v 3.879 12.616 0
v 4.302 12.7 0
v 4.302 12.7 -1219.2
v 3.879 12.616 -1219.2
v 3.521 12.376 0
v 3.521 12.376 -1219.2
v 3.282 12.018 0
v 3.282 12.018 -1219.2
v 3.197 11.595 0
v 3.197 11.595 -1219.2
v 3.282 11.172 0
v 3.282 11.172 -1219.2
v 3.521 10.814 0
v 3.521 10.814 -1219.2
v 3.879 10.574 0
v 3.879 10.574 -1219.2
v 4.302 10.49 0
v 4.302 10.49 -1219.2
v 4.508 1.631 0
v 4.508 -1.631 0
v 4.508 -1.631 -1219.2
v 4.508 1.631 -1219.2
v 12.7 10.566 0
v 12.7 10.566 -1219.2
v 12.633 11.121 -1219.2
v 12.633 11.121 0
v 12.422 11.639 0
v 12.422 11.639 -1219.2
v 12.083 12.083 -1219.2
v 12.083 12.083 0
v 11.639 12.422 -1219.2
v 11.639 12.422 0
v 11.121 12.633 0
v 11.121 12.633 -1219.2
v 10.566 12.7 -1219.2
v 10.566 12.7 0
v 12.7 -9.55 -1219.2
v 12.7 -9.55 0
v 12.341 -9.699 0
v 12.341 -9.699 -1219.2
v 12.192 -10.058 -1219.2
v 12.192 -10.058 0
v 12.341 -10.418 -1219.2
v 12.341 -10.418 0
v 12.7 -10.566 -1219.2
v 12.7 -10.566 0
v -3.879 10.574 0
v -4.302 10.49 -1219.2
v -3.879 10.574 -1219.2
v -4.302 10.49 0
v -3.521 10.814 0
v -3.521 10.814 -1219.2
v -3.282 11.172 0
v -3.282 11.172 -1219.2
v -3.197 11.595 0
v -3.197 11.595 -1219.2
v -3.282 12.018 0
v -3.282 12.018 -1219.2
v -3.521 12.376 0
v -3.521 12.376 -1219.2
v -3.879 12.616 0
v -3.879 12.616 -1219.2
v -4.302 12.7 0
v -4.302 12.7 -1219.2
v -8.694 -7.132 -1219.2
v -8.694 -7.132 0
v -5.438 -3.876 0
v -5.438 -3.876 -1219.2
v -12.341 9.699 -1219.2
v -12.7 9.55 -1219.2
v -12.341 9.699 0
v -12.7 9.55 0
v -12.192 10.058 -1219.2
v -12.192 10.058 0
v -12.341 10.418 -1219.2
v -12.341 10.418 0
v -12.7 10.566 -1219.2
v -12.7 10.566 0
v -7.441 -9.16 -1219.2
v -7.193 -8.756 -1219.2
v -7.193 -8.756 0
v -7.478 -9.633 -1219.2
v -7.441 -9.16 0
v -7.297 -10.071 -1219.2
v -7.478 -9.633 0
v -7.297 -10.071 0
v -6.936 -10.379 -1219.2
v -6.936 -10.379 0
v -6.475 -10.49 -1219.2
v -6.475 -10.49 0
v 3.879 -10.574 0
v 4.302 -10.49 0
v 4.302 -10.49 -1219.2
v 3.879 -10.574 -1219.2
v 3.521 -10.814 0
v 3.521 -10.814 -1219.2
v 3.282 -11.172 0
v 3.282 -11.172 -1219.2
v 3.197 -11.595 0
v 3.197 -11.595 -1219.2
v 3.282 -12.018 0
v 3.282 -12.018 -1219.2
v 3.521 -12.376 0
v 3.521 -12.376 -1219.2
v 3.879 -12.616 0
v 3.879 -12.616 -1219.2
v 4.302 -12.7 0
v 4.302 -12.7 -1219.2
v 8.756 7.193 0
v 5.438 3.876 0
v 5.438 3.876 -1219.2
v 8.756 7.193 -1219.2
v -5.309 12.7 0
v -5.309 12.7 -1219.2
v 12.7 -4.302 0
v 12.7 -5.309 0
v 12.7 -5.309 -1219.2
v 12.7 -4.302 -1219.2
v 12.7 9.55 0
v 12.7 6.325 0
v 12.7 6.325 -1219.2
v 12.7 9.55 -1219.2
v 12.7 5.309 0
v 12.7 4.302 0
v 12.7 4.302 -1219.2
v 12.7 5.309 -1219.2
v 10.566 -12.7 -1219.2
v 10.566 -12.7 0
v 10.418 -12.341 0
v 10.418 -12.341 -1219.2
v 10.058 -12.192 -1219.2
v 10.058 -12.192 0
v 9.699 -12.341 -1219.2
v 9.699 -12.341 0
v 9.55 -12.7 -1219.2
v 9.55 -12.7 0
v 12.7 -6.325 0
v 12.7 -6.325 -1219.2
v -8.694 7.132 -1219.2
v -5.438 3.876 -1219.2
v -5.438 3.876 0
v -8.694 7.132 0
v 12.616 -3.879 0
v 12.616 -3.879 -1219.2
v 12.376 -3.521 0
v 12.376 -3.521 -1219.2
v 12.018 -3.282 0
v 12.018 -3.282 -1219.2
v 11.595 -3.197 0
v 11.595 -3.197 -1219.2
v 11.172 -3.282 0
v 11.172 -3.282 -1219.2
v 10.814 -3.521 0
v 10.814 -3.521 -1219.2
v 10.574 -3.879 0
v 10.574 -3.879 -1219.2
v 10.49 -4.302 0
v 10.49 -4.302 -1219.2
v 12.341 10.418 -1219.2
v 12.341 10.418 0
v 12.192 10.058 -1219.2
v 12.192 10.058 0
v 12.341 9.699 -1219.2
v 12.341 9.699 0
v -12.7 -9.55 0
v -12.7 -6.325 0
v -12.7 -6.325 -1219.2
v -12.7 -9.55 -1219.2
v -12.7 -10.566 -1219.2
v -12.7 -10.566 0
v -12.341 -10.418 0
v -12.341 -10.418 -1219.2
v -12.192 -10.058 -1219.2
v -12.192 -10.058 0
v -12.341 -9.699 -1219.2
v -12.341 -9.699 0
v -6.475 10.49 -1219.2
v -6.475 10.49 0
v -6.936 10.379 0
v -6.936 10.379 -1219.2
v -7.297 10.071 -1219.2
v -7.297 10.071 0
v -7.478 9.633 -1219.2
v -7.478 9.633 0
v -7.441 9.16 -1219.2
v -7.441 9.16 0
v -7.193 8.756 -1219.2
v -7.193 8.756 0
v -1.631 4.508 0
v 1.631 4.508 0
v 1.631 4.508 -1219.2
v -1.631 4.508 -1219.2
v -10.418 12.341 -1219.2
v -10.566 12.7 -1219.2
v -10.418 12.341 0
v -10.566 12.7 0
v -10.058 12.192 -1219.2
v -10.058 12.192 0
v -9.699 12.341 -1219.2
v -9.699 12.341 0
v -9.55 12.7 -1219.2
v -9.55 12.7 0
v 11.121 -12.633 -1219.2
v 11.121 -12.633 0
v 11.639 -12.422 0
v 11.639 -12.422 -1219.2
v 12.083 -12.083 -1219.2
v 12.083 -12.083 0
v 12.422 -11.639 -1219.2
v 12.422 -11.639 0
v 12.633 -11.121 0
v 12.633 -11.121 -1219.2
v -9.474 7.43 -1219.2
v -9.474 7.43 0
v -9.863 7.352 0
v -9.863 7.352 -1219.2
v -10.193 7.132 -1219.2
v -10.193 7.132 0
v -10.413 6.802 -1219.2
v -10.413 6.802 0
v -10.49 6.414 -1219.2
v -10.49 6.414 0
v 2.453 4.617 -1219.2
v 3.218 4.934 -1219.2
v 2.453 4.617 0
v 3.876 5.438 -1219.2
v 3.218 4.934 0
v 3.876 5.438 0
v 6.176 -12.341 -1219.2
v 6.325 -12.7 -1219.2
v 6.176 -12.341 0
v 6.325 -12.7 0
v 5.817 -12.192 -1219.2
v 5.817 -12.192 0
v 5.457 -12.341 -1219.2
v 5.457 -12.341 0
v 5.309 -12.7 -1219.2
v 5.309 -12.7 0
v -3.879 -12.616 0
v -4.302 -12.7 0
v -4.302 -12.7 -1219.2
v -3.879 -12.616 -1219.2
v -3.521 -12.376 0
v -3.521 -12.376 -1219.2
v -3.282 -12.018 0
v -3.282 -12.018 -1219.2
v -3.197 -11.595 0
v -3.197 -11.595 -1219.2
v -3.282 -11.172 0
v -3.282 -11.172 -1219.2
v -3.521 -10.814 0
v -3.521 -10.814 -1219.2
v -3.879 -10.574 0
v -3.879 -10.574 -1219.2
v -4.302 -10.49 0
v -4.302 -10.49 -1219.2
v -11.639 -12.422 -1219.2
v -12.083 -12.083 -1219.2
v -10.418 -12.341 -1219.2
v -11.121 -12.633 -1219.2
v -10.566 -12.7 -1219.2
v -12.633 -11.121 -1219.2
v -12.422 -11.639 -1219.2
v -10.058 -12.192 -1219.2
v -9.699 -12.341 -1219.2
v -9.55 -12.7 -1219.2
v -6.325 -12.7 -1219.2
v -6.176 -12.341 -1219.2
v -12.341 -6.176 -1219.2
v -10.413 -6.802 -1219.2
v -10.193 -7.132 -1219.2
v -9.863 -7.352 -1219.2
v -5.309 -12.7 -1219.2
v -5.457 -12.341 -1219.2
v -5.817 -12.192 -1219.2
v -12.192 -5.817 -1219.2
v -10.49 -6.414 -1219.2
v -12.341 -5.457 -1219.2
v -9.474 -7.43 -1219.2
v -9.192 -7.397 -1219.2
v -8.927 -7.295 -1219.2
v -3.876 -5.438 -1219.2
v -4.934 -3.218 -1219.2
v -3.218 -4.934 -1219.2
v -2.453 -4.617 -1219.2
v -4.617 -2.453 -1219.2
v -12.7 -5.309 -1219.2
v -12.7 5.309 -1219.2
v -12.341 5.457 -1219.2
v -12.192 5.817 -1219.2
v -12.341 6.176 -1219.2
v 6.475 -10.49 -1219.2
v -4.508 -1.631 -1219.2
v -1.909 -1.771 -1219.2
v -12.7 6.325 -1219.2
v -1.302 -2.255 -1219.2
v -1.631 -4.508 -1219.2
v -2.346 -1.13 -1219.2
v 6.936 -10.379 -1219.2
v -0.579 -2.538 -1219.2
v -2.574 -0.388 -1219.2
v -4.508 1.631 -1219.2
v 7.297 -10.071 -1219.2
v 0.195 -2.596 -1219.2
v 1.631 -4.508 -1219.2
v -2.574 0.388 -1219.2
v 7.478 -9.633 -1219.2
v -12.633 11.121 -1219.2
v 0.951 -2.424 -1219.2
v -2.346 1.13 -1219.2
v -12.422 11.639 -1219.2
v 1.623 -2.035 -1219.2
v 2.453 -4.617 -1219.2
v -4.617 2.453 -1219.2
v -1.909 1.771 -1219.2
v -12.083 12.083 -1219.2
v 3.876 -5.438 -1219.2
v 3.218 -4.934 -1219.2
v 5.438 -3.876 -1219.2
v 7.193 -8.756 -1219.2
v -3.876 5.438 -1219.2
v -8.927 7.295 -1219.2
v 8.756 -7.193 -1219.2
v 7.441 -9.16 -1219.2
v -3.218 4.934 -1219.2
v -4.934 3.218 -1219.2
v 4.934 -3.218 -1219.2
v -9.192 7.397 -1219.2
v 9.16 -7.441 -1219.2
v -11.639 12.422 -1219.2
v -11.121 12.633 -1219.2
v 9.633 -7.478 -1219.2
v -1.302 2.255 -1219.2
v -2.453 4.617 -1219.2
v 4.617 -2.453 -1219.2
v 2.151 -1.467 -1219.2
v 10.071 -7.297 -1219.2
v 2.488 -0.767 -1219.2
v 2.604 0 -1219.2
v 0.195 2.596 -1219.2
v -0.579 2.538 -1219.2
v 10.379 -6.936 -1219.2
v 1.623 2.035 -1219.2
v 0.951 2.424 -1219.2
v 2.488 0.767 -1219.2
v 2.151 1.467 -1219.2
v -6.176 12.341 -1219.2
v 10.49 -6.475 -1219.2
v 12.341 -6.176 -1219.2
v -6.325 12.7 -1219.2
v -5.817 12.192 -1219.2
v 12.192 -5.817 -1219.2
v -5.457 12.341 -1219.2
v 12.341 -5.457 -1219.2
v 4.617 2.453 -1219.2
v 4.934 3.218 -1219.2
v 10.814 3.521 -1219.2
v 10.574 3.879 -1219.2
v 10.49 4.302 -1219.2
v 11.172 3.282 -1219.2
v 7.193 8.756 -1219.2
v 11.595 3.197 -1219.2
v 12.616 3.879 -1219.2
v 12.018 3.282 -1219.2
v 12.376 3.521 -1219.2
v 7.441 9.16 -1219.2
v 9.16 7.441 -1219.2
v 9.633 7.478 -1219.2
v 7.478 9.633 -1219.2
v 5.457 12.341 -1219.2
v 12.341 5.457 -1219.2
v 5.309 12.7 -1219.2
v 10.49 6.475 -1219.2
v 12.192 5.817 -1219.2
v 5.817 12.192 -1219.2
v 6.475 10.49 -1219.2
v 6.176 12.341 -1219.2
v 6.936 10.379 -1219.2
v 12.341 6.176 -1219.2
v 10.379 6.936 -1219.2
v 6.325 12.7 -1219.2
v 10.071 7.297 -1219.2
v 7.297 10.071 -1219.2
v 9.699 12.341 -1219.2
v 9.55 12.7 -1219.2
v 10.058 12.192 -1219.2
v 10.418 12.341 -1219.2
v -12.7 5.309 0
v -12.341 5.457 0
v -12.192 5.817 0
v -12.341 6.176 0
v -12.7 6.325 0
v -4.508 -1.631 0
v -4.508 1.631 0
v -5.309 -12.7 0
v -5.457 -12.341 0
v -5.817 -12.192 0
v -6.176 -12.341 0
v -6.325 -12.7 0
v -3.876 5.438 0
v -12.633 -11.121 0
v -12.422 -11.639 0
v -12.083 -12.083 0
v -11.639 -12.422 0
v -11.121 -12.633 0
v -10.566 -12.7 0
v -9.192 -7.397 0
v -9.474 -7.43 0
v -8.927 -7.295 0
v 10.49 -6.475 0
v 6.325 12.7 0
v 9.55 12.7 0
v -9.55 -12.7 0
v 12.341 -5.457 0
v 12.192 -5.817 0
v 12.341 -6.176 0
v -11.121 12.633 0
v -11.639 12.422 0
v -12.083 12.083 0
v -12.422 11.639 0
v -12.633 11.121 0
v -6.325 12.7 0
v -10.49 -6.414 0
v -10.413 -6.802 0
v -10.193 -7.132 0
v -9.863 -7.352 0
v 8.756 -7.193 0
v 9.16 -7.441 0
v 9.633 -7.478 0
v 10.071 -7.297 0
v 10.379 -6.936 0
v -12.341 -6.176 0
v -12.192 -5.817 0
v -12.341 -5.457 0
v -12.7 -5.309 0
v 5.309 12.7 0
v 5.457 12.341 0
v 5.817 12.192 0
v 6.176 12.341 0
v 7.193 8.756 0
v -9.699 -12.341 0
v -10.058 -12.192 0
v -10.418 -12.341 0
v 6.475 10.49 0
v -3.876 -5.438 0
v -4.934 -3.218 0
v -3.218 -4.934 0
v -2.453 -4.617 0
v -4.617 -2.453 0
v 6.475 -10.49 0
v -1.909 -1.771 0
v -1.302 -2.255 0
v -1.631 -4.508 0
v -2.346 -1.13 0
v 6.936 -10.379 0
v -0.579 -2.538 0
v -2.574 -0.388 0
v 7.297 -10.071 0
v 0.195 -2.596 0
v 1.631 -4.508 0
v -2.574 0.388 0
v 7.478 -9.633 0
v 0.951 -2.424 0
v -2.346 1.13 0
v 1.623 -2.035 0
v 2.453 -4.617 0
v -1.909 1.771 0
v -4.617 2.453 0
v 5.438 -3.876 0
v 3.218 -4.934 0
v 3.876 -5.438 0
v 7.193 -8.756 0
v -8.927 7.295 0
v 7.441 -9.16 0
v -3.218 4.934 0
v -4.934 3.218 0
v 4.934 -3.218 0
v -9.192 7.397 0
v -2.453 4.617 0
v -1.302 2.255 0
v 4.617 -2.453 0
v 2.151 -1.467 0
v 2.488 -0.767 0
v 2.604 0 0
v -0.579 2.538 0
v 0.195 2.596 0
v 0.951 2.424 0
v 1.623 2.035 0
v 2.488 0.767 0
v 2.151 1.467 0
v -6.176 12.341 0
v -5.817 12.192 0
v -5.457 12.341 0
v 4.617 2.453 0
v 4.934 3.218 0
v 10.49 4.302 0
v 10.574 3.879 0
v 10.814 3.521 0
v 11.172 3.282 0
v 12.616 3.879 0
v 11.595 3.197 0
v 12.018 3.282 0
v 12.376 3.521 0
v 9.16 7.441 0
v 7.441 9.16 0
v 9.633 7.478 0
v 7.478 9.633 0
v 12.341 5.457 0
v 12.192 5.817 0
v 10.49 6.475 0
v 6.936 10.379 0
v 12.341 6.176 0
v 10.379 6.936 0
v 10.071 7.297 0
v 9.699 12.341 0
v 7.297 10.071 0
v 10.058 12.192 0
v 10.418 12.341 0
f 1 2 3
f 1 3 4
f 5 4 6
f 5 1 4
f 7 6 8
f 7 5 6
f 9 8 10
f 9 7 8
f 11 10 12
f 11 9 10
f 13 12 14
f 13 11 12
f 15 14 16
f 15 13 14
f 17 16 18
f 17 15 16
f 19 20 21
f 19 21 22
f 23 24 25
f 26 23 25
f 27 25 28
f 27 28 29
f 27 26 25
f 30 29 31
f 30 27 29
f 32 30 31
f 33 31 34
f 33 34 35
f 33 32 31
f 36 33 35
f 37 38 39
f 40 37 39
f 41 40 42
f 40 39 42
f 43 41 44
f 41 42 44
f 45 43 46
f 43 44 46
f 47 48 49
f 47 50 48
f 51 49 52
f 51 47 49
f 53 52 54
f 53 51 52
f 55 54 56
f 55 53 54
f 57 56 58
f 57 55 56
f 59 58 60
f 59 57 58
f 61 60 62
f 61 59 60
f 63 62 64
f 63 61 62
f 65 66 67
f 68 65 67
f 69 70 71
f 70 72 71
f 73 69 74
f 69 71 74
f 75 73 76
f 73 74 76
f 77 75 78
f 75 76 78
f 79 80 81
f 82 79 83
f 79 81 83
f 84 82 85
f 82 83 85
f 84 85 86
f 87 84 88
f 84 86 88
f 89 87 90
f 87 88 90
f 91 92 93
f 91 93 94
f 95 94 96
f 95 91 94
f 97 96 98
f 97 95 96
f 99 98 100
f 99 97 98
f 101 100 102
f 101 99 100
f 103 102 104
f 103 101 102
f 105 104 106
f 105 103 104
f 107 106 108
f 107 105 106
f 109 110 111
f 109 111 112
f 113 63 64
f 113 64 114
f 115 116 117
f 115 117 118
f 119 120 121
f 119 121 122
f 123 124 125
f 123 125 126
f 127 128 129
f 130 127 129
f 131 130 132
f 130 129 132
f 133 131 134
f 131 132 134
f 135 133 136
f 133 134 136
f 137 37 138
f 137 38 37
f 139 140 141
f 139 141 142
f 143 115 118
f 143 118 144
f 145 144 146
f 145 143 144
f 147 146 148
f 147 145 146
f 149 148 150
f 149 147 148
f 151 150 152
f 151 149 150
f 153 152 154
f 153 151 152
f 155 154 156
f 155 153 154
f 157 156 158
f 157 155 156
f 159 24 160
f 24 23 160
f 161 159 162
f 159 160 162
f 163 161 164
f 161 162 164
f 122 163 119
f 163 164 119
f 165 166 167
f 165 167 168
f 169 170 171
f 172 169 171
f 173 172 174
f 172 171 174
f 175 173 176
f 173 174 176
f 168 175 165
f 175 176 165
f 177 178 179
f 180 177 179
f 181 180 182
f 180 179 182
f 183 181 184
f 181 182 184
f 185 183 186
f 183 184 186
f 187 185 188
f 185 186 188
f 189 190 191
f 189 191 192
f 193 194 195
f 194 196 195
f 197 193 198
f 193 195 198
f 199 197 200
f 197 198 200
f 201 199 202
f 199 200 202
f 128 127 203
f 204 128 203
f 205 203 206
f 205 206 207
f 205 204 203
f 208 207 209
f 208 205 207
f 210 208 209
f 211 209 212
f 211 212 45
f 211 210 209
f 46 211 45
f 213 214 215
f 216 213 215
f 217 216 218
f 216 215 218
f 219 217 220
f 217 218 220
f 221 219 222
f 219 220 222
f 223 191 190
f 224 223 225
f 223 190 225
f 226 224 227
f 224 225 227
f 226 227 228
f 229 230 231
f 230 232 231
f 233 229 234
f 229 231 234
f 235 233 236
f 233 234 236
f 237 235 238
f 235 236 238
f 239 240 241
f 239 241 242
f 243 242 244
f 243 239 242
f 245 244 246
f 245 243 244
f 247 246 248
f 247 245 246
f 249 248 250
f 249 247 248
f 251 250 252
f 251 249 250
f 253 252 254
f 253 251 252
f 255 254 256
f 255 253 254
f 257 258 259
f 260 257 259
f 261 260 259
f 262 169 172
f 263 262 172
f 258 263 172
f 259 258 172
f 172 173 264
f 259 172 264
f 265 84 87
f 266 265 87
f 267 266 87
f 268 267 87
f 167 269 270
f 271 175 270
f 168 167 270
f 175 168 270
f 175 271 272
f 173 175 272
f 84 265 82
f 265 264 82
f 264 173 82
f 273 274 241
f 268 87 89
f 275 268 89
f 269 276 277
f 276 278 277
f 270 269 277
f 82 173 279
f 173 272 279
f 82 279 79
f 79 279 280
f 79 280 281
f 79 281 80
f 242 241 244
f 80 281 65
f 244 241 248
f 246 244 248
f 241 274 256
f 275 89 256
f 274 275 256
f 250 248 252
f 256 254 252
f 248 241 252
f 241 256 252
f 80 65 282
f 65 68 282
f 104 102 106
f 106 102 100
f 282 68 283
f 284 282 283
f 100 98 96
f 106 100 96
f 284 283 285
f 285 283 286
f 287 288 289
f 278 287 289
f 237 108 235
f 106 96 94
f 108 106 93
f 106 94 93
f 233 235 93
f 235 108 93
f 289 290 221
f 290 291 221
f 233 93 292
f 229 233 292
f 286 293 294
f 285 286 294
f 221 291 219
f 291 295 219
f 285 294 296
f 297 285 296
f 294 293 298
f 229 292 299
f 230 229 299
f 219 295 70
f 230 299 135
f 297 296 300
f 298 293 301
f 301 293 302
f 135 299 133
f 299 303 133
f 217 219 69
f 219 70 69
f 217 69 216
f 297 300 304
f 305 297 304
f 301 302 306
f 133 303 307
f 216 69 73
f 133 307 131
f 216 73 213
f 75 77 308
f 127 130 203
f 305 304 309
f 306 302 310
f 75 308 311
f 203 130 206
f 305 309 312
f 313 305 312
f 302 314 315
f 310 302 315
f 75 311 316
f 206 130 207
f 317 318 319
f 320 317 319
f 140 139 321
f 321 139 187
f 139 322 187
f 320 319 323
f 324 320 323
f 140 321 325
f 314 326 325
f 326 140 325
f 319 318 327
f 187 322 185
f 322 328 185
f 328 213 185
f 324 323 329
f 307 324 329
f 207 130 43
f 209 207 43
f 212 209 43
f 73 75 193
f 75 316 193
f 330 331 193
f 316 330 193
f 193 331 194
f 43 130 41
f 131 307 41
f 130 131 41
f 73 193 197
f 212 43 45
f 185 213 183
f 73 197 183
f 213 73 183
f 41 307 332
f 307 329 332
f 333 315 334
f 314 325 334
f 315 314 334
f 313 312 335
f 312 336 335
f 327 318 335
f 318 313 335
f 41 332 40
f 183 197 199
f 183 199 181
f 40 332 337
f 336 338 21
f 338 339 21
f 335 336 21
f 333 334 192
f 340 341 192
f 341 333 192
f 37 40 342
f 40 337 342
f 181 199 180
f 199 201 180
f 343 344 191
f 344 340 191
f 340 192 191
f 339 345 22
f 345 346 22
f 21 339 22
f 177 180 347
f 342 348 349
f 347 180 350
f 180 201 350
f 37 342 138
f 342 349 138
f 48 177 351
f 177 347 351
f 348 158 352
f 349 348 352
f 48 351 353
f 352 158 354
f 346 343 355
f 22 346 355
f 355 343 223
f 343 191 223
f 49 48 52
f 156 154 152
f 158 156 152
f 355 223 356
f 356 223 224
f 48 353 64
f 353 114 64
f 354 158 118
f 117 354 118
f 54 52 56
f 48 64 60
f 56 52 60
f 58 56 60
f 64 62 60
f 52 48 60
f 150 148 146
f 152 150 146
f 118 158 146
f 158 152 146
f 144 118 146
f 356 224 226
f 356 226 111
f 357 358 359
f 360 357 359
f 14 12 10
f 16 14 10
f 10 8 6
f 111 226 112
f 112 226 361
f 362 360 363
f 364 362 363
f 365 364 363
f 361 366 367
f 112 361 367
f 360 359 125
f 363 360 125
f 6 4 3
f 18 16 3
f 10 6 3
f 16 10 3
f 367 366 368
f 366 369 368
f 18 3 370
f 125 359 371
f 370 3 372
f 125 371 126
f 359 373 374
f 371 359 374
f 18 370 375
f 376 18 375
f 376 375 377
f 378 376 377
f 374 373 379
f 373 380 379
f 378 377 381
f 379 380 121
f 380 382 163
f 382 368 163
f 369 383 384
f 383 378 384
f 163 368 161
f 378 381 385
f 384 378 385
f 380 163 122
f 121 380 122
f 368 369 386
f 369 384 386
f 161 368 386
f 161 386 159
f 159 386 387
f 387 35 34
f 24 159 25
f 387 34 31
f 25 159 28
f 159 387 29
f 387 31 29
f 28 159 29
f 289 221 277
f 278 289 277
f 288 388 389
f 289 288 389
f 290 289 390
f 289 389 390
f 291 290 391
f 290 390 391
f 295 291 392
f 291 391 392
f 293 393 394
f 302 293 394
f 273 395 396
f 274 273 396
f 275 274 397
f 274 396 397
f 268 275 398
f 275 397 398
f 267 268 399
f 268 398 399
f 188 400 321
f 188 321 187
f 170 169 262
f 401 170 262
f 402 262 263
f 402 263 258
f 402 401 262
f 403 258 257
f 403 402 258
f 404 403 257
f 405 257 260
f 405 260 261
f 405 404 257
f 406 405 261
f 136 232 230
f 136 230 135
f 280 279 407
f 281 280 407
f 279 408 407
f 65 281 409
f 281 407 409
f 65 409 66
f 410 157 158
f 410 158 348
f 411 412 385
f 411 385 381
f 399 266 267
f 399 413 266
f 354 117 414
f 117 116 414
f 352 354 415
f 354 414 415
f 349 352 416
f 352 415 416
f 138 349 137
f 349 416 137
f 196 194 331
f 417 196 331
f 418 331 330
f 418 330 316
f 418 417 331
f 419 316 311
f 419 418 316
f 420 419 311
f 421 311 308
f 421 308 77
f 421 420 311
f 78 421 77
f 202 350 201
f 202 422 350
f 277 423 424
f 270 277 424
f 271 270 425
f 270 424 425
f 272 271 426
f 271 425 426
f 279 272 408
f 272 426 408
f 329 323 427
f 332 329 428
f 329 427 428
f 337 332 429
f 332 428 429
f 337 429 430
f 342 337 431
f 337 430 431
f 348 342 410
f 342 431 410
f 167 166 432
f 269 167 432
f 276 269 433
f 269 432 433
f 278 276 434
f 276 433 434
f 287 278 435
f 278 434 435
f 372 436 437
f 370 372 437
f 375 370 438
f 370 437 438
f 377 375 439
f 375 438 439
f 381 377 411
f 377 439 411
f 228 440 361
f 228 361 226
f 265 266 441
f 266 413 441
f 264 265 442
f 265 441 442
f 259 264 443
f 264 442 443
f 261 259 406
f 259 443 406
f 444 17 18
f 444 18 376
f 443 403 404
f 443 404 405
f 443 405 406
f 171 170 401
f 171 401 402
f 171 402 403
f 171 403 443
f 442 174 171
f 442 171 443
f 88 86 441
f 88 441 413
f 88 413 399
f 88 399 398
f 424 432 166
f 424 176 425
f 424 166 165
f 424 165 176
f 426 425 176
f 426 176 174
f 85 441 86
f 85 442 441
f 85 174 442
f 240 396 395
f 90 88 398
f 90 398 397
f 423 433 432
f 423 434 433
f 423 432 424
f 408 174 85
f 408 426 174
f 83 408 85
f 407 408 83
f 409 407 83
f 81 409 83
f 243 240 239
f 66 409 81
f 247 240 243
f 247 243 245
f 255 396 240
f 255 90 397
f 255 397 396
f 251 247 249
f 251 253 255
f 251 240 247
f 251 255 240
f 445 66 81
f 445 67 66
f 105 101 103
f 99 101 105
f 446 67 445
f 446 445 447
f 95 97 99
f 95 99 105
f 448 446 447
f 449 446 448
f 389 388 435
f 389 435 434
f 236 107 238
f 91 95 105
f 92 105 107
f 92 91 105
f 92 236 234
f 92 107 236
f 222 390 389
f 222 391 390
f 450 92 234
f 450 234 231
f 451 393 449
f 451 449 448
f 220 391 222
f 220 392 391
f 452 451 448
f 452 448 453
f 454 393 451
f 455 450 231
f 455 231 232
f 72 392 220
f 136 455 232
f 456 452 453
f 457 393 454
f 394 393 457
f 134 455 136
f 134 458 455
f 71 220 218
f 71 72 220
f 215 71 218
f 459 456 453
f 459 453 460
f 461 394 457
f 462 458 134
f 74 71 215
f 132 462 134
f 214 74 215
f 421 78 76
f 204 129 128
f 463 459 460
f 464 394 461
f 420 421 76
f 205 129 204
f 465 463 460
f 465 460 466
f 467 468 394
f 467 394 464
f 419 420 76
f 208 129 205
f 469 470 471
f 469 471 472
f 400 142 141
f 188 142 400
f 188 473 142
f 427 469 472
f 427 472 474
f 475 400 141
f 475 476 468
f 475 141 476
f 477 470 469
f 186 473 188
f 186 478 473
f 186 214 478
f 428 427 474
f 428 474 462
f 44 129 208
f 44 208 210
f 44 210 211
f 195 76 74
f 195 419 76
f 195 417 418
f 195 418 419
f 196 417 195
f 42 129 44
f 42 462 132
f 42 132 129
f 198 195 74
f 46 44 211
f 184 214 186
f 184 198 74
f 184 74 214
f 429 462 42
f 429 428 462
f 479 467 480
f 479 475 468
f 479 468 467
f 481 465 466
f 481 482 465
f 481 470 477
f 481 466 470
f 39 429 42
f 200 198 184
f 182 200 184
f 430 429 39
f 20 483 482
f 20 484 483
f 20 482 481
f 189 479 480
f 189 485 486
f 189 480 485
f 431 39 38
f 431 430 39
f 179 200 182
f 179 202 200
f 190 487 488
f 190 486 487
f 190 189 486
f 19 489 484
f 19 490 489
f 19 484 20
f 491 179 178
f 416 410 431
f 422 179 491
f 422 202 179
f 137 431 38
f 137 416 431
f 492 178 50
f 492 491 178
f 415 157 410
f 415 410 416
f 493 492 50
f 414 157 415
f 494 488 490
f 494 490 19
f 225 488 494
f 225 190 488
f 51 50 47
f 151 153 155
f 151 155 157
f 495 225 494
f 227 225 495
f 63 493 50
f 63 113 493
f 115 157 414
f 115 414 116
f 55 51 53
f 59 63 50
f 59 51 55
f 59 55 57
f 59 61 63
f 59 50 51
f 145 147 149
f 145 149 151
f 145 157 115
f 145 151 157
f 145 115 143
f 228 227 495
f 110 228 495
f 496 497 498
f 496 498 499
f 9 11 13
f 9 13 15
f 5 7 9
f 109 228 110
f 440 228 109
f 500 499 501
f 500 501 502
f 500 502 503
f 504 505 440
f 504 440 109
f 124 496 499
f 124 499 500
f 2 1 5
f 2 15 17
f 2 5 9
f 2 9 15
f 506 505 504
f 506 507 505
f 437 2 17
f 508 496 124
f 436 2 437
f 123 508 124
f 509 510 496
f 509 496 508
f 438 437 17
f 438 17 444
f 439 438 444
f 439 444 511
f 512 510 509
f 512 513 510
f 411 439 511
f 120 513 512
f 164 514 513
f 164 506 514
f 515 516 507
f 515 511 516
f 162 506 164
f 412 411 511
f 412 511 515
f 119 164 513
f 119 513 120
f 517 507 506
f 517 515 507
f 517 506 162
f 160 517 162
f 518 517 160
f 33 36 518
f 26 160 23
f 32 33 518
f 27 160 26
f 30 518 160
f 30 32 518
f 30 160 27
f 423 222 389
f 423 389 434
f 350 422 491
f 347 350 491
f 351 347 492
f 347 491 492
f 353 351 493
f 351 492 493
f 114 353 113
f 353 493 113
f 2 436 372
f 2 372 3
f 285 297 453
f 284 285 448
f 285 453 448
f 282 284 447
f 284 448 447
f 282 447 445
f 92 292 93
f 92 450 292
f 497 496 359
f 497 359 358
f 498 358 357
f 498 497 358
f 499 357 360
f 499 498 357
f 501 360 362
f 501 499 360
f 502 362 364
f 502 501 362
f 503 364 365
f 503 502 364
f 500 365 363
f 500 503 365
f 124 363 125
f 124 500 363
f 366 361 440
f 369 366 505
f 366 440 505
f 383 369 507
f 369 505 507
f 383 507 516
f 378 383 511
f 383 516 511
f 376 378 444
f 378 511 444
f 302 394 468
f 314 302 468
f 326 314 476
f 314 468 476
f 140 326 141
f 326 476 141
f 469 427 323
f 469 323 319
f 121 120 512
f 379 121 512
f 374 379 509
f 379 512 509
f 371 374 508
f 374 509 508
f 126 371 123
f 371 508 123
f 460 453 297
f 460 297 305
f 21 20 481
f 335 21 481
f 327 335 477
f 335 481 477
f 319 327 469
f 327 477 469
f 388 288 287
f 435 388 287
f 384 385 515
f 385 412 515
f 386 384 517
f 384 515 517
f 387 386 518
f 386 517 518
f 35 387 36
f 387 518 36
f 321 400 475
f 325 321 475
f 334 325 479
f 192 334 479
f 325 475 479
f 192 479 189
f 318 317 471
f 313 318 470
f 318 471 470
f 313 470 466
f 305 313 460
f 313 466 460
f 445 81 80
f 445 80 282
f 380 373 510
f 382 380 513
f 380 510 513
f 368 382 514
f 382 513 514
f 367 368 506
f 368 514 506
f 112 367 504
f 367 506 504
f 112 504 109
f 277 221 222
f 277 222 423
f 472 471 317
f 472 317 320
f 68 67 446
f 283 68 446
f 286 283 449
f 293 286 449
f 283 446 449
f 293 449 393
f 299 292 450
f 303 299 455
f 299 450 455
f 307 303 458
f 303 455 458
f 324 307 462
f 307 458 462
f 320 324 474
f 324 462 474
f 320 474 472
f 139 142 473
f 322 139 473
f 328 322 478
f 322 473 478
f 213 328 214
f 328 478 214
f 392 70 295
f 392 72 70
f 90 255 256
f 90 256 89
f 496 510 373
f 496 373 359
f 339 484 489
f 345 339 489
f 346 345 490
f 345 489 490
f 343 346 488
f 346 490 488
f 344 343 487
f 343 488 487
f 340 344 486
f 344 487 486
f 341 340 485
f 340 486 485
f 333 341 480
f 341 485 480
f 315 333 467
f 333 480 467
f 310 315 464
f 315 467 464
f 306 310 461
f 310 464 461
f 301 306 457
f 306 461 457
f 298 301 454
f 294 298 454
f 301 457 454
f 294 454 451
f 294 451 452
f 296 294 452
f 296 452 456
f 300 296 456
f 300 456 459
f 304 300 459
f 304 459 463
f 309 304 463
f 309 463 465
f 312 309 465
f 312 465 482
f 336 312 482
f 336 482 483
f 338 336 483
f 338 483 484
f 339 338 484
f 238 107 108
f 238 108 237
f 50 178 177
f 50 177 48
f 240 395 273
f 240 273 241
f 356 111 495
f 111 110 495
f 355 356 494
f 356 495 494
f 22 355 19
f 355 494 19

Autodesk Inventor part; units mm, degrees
ref_plane "YZ Plane" through (0, 0, 0) normal (1, 0, 0) x (0, 1, 0)
ref_plane "XZ Plane" through (0, 0, 0) normal (0, 1, 0) x (-1, 0, 0)
ref_plane "XY Plane" through (0, 0, 0) normal (0, 0, 1) x (1, 0, 0)
sketch "Sketch_1" plane through (0, 0, 0) normal (0, 0, 1) x (1, 0, 0)
  arc A0 (-12.7, -10.5664) -> (-10.5664, -12.7) centre (-10.592, -10.592) ccw
  arc A1 (-9.5504, -12.7) -> (-10.5664, -12.7) centre (-10.0584, -12.7) ccw
  line L0 (-9.5504, -12.7) -> (-6.3246, -12.7)
  arc A2 (-5.3086, -12.7) -> (-6.3246, -12.7) centre (-5.8166, -12.7) ccw
  line L1 (-5.3086, -12.7) -> (-4.3023, -12.7)
  arc A3 (-4.3023, -12.7) -> (-4.3023, -10.4902) centre (-4.3023, -11.5951) ccw
  line L2 (-4.3023, -10.4902) -> (-6.4748, -10.4902)
  arc A4 (-7.1932, -8.7558) -> (-6.4748, -10.4902) centre (-6.4748, -9.4742) ccw
  line L3 (-7.1932, -8.7558) -> (-3.8759, -5.4384)
  arc A5 (-1.6308, -4.5085) -> (-3.8759, -5.4384) centre (-1.6308, -7.6835) ccw
  line L4 (-1.6308, -4.5085) -> (1.6308, -4.5085)
  arc A6 (3.8759, -5.4384) -> (1.6308, -4.5085) centre (1.6308, -7.6835) ccw
  line L5 (3.8759, -5.4384) -> (7.1932, -8.7558)
  arc A7 (6.4748, -10.4902) -> (7.1932, -8.7558) centre (6.4748, -9.4742) ccw
  line L6 (6.4748, -10.4902) -> (4.3023, -10.4902)
  arc A8 (4.3023, -10.4902) -> (4.3023, -12.7) centre (4.3023, -11.5951) ccw
  line L7 (4.3023, -12.7) -> (5.3086, -12.7)
  arc A9 (6.3246, -12.7) -> (5.3086, -12.7) centre (5.8166, -12.7) ccw
  line L8 (6.3246, -12.7) -> (9.5504, -12.7)
  arc A10 (10.5664, -12.7) -> (9.5504, -12.7) centre (10.0584, -12.7) ccw
  arc A11 (10.5664, -12.7) -> (12.7, -10.5664) centre (10.592, -10.592) ccw
  arc A12 (12.7, -9.5504) -> (12.7, -10.5664) centre (12.7, -10.0584) ccw
  line L9 (12.7, -9.5504) -> (12.7, -6.3246)
  arc A13 (12.7, -5.3086) -> (12.7, -6.3246) centre (12.7, -5.8166) ccw
  line L10 (12.7, -5.3086) -> (12.7, -4.3023)
  arc A14 (12.7, -4.3023) -> (10.4902, -4.3023) centre (11.5951, -4.3023) ccw
  line L11 (10.4902, -4.3023) -> (10.4902, -6.4748)
  arc A15 (8.7558, -7.1932) -> (10.4902, -6.4748) centre (9.4742, -6.4748) ccw
  line L12 (8.7558, -7.1932) -> (5.4384, -3.8759)
  arc A16 (4.5085, -1.6308) -> (5.4384, -3.8759) centre (7.6835, -1.6308) ccw
  line L13 (4.5085, -1.6308) -> (4.5085, 1.6308)
  arc A17 (5.4384, 3.8759) -> (4.5085, 1.6308) centre (7.6835, 1.6308) ccw
  line L14 (5.4384, 3.8759) -> (8.7558, 7.1932)
  arc A18 (10.4902, 6.4748) -> (8.7558, 7.1932) centre (9.4742, 6.4748) ccw
  line L15 (10.4902, 6.4748) -> (10.4902, 4.3023)
  arc A19 (10.4902, 4.3023) -> (12.7, 4.3023) centre (11.5951, 4.3023) ccw
  line L16 (12.7, 4.3023) -> (12.7, 5.3086)
  arc A20 (12.7, 6.3246) -> (12.7, 5.3086) centre (12.7, 5.8166) ccw
  line L17 (12.7, 6.3246) -> (12.7, 9.5504)
  arc A21 (12.7, 10.5664) -> (12.7, 9.5504) centre (12.7, 10.0584) ccw
  arc A22 (12.7, 10.5664) -> (10.5664, 12.7) centre (10.592, 10.592) ccw
  arc A23 (9.5504, 12.7) -> (10.5664, 12.7) centre (10.0584, 12.7) ccw
  line L18 (9.5504, 12.7) -> (6.3246, 12.7)
  arc A24 (5.3086, 12.7) -> (6.3246, 12.7) centre (5.8166, 12.7) ccw
  line L19 (5.3086, 12.7) -> (4.3023, 12.7)
  arc A25 (4.3023, 12.7) -> (4.3023, 10.4902) centre (4.3023, 11.5951) ccw
  line L20 (4.3023, 10.4902) -> (6.4748, 10.4902)
  arc A26 (7.1932, 8.7558) -> (6.4748, 10.4902) centre (6.4748, 9.4742) ccw
  line L21 (7.1932, 8.7558) -> (3.8759, 5.4384)
  arc A27 (1.6308, 4.5085) -> (3.8759, 5.4384) centre (1.6308, 7.6835) ccw
  line L22 (1.6308, 4.5085) -> (-1.6308, 4.5085)
  arc A28 (-3.8759, 5.4384) -> (-1.6308, 4.5085) centre (-1.6308, 7.6835) ccw
  line L23 (-3.8759, 5.4384) -> (-7.1932, 8.7558)
  arc A29 (-6.4748, 10.4902) -> (-7.1932, 8.7558) centre (-6.4748, 9.4742) ccw
  line L24 (-6.4748, 10.4902) -> (-4.3023, 10.4902)
  arc A30 (-4.3023, 10.4902) -> (-4.3023, 12.7) centre (-4.3023, 11.5951) ccw
  line L25 (-4.3023, 12.7) -> (-5.3086, 12.7)
  arc A31 (-6.3246, 12.7) -> (-5.3086, 12.7) centre (-5.8166, 12.7) ccw
  line L26 (-6.3246, 12.7) -> (-9.5504, 12.7)
  arc A32 (-10.5664, 12.7) -> (-9.5504, 12.7) centre (-10.0584, 12.7) ccw
  arc A33 (-10.5664, 12.7) -> (-12.7, 10.5664) centre (-10.592, 10.592) ccw
  arc A34 (-12.7, 9.5504) -> (-12.7, 10.5664) centre (-12.7, 10.0584) ccw
  line L27 (-12.7, 9.5504) -> (-12.7, 6.3246)
  arc A35 (-12.7, 5.3086) -> (-12.7, 6.3246) centre (-12.7, 5.8166) ccw
  line L28 (-12.7, 5.3086) -> (-12.7, -5.3086)
  arc A36 (-12.7, -6.3246) -> (-12.7, -5.3086) centre (-12.7, -5.8166) ccw
  line L29 (-12.7, -6.3246) -> (-12.7, -9.5504)
  arc A37 (-12.7, -10.5664) -> (-12.7, -9.5504) centre (-12.7, -10.0584) ccw
  circle A38 centre (0, 0) radius 2.6035
  arc A39 (-10.4902, -6.4135) -> (-9.4742, -7.4295) centre (-9.4742, -6.4135) ccw
  arc A40 (-9.4742, -7.4295) -> (-8.6945, -7.1319) centre (-9.4638, -6.2865) ccw
  line L30 (-8.6945, -7.1319) -> (-5.4384, -3.8759)
  arc A41 (-5.4384, -3.8759) -> (-4.5085, -1.6308) centre (-7.6835, -1.6308) ccw
  line L31 (-4.5085, -1.6308) -> (-4.5085, 1.6308)
  arc A42 (-4.5085, 1.6308) -> (-5.4384, 3.8759) centre (-7.6835, 1.6308) ccw
  line L32 (-5.4384, 3.8759) -> (-8.6945, 7.1319)
  arc A43 (-8.6945, 7.1319) -> (-9.4742, 7.4295) centre (-9.4638, 6.2865) ccw
  arc A44 (-9.4742, 7.4295) -> (-10.4902, 6.4135) centre (-9.4742, 6.4135) ccw
  line L33 (-10.4902, 6.4135) -> (-10.4902, -6.4135)
extrude "Extrusion1" add sketch "Sketch_1" against normal blind 1219.2
properties part number "1003-48-CL"
